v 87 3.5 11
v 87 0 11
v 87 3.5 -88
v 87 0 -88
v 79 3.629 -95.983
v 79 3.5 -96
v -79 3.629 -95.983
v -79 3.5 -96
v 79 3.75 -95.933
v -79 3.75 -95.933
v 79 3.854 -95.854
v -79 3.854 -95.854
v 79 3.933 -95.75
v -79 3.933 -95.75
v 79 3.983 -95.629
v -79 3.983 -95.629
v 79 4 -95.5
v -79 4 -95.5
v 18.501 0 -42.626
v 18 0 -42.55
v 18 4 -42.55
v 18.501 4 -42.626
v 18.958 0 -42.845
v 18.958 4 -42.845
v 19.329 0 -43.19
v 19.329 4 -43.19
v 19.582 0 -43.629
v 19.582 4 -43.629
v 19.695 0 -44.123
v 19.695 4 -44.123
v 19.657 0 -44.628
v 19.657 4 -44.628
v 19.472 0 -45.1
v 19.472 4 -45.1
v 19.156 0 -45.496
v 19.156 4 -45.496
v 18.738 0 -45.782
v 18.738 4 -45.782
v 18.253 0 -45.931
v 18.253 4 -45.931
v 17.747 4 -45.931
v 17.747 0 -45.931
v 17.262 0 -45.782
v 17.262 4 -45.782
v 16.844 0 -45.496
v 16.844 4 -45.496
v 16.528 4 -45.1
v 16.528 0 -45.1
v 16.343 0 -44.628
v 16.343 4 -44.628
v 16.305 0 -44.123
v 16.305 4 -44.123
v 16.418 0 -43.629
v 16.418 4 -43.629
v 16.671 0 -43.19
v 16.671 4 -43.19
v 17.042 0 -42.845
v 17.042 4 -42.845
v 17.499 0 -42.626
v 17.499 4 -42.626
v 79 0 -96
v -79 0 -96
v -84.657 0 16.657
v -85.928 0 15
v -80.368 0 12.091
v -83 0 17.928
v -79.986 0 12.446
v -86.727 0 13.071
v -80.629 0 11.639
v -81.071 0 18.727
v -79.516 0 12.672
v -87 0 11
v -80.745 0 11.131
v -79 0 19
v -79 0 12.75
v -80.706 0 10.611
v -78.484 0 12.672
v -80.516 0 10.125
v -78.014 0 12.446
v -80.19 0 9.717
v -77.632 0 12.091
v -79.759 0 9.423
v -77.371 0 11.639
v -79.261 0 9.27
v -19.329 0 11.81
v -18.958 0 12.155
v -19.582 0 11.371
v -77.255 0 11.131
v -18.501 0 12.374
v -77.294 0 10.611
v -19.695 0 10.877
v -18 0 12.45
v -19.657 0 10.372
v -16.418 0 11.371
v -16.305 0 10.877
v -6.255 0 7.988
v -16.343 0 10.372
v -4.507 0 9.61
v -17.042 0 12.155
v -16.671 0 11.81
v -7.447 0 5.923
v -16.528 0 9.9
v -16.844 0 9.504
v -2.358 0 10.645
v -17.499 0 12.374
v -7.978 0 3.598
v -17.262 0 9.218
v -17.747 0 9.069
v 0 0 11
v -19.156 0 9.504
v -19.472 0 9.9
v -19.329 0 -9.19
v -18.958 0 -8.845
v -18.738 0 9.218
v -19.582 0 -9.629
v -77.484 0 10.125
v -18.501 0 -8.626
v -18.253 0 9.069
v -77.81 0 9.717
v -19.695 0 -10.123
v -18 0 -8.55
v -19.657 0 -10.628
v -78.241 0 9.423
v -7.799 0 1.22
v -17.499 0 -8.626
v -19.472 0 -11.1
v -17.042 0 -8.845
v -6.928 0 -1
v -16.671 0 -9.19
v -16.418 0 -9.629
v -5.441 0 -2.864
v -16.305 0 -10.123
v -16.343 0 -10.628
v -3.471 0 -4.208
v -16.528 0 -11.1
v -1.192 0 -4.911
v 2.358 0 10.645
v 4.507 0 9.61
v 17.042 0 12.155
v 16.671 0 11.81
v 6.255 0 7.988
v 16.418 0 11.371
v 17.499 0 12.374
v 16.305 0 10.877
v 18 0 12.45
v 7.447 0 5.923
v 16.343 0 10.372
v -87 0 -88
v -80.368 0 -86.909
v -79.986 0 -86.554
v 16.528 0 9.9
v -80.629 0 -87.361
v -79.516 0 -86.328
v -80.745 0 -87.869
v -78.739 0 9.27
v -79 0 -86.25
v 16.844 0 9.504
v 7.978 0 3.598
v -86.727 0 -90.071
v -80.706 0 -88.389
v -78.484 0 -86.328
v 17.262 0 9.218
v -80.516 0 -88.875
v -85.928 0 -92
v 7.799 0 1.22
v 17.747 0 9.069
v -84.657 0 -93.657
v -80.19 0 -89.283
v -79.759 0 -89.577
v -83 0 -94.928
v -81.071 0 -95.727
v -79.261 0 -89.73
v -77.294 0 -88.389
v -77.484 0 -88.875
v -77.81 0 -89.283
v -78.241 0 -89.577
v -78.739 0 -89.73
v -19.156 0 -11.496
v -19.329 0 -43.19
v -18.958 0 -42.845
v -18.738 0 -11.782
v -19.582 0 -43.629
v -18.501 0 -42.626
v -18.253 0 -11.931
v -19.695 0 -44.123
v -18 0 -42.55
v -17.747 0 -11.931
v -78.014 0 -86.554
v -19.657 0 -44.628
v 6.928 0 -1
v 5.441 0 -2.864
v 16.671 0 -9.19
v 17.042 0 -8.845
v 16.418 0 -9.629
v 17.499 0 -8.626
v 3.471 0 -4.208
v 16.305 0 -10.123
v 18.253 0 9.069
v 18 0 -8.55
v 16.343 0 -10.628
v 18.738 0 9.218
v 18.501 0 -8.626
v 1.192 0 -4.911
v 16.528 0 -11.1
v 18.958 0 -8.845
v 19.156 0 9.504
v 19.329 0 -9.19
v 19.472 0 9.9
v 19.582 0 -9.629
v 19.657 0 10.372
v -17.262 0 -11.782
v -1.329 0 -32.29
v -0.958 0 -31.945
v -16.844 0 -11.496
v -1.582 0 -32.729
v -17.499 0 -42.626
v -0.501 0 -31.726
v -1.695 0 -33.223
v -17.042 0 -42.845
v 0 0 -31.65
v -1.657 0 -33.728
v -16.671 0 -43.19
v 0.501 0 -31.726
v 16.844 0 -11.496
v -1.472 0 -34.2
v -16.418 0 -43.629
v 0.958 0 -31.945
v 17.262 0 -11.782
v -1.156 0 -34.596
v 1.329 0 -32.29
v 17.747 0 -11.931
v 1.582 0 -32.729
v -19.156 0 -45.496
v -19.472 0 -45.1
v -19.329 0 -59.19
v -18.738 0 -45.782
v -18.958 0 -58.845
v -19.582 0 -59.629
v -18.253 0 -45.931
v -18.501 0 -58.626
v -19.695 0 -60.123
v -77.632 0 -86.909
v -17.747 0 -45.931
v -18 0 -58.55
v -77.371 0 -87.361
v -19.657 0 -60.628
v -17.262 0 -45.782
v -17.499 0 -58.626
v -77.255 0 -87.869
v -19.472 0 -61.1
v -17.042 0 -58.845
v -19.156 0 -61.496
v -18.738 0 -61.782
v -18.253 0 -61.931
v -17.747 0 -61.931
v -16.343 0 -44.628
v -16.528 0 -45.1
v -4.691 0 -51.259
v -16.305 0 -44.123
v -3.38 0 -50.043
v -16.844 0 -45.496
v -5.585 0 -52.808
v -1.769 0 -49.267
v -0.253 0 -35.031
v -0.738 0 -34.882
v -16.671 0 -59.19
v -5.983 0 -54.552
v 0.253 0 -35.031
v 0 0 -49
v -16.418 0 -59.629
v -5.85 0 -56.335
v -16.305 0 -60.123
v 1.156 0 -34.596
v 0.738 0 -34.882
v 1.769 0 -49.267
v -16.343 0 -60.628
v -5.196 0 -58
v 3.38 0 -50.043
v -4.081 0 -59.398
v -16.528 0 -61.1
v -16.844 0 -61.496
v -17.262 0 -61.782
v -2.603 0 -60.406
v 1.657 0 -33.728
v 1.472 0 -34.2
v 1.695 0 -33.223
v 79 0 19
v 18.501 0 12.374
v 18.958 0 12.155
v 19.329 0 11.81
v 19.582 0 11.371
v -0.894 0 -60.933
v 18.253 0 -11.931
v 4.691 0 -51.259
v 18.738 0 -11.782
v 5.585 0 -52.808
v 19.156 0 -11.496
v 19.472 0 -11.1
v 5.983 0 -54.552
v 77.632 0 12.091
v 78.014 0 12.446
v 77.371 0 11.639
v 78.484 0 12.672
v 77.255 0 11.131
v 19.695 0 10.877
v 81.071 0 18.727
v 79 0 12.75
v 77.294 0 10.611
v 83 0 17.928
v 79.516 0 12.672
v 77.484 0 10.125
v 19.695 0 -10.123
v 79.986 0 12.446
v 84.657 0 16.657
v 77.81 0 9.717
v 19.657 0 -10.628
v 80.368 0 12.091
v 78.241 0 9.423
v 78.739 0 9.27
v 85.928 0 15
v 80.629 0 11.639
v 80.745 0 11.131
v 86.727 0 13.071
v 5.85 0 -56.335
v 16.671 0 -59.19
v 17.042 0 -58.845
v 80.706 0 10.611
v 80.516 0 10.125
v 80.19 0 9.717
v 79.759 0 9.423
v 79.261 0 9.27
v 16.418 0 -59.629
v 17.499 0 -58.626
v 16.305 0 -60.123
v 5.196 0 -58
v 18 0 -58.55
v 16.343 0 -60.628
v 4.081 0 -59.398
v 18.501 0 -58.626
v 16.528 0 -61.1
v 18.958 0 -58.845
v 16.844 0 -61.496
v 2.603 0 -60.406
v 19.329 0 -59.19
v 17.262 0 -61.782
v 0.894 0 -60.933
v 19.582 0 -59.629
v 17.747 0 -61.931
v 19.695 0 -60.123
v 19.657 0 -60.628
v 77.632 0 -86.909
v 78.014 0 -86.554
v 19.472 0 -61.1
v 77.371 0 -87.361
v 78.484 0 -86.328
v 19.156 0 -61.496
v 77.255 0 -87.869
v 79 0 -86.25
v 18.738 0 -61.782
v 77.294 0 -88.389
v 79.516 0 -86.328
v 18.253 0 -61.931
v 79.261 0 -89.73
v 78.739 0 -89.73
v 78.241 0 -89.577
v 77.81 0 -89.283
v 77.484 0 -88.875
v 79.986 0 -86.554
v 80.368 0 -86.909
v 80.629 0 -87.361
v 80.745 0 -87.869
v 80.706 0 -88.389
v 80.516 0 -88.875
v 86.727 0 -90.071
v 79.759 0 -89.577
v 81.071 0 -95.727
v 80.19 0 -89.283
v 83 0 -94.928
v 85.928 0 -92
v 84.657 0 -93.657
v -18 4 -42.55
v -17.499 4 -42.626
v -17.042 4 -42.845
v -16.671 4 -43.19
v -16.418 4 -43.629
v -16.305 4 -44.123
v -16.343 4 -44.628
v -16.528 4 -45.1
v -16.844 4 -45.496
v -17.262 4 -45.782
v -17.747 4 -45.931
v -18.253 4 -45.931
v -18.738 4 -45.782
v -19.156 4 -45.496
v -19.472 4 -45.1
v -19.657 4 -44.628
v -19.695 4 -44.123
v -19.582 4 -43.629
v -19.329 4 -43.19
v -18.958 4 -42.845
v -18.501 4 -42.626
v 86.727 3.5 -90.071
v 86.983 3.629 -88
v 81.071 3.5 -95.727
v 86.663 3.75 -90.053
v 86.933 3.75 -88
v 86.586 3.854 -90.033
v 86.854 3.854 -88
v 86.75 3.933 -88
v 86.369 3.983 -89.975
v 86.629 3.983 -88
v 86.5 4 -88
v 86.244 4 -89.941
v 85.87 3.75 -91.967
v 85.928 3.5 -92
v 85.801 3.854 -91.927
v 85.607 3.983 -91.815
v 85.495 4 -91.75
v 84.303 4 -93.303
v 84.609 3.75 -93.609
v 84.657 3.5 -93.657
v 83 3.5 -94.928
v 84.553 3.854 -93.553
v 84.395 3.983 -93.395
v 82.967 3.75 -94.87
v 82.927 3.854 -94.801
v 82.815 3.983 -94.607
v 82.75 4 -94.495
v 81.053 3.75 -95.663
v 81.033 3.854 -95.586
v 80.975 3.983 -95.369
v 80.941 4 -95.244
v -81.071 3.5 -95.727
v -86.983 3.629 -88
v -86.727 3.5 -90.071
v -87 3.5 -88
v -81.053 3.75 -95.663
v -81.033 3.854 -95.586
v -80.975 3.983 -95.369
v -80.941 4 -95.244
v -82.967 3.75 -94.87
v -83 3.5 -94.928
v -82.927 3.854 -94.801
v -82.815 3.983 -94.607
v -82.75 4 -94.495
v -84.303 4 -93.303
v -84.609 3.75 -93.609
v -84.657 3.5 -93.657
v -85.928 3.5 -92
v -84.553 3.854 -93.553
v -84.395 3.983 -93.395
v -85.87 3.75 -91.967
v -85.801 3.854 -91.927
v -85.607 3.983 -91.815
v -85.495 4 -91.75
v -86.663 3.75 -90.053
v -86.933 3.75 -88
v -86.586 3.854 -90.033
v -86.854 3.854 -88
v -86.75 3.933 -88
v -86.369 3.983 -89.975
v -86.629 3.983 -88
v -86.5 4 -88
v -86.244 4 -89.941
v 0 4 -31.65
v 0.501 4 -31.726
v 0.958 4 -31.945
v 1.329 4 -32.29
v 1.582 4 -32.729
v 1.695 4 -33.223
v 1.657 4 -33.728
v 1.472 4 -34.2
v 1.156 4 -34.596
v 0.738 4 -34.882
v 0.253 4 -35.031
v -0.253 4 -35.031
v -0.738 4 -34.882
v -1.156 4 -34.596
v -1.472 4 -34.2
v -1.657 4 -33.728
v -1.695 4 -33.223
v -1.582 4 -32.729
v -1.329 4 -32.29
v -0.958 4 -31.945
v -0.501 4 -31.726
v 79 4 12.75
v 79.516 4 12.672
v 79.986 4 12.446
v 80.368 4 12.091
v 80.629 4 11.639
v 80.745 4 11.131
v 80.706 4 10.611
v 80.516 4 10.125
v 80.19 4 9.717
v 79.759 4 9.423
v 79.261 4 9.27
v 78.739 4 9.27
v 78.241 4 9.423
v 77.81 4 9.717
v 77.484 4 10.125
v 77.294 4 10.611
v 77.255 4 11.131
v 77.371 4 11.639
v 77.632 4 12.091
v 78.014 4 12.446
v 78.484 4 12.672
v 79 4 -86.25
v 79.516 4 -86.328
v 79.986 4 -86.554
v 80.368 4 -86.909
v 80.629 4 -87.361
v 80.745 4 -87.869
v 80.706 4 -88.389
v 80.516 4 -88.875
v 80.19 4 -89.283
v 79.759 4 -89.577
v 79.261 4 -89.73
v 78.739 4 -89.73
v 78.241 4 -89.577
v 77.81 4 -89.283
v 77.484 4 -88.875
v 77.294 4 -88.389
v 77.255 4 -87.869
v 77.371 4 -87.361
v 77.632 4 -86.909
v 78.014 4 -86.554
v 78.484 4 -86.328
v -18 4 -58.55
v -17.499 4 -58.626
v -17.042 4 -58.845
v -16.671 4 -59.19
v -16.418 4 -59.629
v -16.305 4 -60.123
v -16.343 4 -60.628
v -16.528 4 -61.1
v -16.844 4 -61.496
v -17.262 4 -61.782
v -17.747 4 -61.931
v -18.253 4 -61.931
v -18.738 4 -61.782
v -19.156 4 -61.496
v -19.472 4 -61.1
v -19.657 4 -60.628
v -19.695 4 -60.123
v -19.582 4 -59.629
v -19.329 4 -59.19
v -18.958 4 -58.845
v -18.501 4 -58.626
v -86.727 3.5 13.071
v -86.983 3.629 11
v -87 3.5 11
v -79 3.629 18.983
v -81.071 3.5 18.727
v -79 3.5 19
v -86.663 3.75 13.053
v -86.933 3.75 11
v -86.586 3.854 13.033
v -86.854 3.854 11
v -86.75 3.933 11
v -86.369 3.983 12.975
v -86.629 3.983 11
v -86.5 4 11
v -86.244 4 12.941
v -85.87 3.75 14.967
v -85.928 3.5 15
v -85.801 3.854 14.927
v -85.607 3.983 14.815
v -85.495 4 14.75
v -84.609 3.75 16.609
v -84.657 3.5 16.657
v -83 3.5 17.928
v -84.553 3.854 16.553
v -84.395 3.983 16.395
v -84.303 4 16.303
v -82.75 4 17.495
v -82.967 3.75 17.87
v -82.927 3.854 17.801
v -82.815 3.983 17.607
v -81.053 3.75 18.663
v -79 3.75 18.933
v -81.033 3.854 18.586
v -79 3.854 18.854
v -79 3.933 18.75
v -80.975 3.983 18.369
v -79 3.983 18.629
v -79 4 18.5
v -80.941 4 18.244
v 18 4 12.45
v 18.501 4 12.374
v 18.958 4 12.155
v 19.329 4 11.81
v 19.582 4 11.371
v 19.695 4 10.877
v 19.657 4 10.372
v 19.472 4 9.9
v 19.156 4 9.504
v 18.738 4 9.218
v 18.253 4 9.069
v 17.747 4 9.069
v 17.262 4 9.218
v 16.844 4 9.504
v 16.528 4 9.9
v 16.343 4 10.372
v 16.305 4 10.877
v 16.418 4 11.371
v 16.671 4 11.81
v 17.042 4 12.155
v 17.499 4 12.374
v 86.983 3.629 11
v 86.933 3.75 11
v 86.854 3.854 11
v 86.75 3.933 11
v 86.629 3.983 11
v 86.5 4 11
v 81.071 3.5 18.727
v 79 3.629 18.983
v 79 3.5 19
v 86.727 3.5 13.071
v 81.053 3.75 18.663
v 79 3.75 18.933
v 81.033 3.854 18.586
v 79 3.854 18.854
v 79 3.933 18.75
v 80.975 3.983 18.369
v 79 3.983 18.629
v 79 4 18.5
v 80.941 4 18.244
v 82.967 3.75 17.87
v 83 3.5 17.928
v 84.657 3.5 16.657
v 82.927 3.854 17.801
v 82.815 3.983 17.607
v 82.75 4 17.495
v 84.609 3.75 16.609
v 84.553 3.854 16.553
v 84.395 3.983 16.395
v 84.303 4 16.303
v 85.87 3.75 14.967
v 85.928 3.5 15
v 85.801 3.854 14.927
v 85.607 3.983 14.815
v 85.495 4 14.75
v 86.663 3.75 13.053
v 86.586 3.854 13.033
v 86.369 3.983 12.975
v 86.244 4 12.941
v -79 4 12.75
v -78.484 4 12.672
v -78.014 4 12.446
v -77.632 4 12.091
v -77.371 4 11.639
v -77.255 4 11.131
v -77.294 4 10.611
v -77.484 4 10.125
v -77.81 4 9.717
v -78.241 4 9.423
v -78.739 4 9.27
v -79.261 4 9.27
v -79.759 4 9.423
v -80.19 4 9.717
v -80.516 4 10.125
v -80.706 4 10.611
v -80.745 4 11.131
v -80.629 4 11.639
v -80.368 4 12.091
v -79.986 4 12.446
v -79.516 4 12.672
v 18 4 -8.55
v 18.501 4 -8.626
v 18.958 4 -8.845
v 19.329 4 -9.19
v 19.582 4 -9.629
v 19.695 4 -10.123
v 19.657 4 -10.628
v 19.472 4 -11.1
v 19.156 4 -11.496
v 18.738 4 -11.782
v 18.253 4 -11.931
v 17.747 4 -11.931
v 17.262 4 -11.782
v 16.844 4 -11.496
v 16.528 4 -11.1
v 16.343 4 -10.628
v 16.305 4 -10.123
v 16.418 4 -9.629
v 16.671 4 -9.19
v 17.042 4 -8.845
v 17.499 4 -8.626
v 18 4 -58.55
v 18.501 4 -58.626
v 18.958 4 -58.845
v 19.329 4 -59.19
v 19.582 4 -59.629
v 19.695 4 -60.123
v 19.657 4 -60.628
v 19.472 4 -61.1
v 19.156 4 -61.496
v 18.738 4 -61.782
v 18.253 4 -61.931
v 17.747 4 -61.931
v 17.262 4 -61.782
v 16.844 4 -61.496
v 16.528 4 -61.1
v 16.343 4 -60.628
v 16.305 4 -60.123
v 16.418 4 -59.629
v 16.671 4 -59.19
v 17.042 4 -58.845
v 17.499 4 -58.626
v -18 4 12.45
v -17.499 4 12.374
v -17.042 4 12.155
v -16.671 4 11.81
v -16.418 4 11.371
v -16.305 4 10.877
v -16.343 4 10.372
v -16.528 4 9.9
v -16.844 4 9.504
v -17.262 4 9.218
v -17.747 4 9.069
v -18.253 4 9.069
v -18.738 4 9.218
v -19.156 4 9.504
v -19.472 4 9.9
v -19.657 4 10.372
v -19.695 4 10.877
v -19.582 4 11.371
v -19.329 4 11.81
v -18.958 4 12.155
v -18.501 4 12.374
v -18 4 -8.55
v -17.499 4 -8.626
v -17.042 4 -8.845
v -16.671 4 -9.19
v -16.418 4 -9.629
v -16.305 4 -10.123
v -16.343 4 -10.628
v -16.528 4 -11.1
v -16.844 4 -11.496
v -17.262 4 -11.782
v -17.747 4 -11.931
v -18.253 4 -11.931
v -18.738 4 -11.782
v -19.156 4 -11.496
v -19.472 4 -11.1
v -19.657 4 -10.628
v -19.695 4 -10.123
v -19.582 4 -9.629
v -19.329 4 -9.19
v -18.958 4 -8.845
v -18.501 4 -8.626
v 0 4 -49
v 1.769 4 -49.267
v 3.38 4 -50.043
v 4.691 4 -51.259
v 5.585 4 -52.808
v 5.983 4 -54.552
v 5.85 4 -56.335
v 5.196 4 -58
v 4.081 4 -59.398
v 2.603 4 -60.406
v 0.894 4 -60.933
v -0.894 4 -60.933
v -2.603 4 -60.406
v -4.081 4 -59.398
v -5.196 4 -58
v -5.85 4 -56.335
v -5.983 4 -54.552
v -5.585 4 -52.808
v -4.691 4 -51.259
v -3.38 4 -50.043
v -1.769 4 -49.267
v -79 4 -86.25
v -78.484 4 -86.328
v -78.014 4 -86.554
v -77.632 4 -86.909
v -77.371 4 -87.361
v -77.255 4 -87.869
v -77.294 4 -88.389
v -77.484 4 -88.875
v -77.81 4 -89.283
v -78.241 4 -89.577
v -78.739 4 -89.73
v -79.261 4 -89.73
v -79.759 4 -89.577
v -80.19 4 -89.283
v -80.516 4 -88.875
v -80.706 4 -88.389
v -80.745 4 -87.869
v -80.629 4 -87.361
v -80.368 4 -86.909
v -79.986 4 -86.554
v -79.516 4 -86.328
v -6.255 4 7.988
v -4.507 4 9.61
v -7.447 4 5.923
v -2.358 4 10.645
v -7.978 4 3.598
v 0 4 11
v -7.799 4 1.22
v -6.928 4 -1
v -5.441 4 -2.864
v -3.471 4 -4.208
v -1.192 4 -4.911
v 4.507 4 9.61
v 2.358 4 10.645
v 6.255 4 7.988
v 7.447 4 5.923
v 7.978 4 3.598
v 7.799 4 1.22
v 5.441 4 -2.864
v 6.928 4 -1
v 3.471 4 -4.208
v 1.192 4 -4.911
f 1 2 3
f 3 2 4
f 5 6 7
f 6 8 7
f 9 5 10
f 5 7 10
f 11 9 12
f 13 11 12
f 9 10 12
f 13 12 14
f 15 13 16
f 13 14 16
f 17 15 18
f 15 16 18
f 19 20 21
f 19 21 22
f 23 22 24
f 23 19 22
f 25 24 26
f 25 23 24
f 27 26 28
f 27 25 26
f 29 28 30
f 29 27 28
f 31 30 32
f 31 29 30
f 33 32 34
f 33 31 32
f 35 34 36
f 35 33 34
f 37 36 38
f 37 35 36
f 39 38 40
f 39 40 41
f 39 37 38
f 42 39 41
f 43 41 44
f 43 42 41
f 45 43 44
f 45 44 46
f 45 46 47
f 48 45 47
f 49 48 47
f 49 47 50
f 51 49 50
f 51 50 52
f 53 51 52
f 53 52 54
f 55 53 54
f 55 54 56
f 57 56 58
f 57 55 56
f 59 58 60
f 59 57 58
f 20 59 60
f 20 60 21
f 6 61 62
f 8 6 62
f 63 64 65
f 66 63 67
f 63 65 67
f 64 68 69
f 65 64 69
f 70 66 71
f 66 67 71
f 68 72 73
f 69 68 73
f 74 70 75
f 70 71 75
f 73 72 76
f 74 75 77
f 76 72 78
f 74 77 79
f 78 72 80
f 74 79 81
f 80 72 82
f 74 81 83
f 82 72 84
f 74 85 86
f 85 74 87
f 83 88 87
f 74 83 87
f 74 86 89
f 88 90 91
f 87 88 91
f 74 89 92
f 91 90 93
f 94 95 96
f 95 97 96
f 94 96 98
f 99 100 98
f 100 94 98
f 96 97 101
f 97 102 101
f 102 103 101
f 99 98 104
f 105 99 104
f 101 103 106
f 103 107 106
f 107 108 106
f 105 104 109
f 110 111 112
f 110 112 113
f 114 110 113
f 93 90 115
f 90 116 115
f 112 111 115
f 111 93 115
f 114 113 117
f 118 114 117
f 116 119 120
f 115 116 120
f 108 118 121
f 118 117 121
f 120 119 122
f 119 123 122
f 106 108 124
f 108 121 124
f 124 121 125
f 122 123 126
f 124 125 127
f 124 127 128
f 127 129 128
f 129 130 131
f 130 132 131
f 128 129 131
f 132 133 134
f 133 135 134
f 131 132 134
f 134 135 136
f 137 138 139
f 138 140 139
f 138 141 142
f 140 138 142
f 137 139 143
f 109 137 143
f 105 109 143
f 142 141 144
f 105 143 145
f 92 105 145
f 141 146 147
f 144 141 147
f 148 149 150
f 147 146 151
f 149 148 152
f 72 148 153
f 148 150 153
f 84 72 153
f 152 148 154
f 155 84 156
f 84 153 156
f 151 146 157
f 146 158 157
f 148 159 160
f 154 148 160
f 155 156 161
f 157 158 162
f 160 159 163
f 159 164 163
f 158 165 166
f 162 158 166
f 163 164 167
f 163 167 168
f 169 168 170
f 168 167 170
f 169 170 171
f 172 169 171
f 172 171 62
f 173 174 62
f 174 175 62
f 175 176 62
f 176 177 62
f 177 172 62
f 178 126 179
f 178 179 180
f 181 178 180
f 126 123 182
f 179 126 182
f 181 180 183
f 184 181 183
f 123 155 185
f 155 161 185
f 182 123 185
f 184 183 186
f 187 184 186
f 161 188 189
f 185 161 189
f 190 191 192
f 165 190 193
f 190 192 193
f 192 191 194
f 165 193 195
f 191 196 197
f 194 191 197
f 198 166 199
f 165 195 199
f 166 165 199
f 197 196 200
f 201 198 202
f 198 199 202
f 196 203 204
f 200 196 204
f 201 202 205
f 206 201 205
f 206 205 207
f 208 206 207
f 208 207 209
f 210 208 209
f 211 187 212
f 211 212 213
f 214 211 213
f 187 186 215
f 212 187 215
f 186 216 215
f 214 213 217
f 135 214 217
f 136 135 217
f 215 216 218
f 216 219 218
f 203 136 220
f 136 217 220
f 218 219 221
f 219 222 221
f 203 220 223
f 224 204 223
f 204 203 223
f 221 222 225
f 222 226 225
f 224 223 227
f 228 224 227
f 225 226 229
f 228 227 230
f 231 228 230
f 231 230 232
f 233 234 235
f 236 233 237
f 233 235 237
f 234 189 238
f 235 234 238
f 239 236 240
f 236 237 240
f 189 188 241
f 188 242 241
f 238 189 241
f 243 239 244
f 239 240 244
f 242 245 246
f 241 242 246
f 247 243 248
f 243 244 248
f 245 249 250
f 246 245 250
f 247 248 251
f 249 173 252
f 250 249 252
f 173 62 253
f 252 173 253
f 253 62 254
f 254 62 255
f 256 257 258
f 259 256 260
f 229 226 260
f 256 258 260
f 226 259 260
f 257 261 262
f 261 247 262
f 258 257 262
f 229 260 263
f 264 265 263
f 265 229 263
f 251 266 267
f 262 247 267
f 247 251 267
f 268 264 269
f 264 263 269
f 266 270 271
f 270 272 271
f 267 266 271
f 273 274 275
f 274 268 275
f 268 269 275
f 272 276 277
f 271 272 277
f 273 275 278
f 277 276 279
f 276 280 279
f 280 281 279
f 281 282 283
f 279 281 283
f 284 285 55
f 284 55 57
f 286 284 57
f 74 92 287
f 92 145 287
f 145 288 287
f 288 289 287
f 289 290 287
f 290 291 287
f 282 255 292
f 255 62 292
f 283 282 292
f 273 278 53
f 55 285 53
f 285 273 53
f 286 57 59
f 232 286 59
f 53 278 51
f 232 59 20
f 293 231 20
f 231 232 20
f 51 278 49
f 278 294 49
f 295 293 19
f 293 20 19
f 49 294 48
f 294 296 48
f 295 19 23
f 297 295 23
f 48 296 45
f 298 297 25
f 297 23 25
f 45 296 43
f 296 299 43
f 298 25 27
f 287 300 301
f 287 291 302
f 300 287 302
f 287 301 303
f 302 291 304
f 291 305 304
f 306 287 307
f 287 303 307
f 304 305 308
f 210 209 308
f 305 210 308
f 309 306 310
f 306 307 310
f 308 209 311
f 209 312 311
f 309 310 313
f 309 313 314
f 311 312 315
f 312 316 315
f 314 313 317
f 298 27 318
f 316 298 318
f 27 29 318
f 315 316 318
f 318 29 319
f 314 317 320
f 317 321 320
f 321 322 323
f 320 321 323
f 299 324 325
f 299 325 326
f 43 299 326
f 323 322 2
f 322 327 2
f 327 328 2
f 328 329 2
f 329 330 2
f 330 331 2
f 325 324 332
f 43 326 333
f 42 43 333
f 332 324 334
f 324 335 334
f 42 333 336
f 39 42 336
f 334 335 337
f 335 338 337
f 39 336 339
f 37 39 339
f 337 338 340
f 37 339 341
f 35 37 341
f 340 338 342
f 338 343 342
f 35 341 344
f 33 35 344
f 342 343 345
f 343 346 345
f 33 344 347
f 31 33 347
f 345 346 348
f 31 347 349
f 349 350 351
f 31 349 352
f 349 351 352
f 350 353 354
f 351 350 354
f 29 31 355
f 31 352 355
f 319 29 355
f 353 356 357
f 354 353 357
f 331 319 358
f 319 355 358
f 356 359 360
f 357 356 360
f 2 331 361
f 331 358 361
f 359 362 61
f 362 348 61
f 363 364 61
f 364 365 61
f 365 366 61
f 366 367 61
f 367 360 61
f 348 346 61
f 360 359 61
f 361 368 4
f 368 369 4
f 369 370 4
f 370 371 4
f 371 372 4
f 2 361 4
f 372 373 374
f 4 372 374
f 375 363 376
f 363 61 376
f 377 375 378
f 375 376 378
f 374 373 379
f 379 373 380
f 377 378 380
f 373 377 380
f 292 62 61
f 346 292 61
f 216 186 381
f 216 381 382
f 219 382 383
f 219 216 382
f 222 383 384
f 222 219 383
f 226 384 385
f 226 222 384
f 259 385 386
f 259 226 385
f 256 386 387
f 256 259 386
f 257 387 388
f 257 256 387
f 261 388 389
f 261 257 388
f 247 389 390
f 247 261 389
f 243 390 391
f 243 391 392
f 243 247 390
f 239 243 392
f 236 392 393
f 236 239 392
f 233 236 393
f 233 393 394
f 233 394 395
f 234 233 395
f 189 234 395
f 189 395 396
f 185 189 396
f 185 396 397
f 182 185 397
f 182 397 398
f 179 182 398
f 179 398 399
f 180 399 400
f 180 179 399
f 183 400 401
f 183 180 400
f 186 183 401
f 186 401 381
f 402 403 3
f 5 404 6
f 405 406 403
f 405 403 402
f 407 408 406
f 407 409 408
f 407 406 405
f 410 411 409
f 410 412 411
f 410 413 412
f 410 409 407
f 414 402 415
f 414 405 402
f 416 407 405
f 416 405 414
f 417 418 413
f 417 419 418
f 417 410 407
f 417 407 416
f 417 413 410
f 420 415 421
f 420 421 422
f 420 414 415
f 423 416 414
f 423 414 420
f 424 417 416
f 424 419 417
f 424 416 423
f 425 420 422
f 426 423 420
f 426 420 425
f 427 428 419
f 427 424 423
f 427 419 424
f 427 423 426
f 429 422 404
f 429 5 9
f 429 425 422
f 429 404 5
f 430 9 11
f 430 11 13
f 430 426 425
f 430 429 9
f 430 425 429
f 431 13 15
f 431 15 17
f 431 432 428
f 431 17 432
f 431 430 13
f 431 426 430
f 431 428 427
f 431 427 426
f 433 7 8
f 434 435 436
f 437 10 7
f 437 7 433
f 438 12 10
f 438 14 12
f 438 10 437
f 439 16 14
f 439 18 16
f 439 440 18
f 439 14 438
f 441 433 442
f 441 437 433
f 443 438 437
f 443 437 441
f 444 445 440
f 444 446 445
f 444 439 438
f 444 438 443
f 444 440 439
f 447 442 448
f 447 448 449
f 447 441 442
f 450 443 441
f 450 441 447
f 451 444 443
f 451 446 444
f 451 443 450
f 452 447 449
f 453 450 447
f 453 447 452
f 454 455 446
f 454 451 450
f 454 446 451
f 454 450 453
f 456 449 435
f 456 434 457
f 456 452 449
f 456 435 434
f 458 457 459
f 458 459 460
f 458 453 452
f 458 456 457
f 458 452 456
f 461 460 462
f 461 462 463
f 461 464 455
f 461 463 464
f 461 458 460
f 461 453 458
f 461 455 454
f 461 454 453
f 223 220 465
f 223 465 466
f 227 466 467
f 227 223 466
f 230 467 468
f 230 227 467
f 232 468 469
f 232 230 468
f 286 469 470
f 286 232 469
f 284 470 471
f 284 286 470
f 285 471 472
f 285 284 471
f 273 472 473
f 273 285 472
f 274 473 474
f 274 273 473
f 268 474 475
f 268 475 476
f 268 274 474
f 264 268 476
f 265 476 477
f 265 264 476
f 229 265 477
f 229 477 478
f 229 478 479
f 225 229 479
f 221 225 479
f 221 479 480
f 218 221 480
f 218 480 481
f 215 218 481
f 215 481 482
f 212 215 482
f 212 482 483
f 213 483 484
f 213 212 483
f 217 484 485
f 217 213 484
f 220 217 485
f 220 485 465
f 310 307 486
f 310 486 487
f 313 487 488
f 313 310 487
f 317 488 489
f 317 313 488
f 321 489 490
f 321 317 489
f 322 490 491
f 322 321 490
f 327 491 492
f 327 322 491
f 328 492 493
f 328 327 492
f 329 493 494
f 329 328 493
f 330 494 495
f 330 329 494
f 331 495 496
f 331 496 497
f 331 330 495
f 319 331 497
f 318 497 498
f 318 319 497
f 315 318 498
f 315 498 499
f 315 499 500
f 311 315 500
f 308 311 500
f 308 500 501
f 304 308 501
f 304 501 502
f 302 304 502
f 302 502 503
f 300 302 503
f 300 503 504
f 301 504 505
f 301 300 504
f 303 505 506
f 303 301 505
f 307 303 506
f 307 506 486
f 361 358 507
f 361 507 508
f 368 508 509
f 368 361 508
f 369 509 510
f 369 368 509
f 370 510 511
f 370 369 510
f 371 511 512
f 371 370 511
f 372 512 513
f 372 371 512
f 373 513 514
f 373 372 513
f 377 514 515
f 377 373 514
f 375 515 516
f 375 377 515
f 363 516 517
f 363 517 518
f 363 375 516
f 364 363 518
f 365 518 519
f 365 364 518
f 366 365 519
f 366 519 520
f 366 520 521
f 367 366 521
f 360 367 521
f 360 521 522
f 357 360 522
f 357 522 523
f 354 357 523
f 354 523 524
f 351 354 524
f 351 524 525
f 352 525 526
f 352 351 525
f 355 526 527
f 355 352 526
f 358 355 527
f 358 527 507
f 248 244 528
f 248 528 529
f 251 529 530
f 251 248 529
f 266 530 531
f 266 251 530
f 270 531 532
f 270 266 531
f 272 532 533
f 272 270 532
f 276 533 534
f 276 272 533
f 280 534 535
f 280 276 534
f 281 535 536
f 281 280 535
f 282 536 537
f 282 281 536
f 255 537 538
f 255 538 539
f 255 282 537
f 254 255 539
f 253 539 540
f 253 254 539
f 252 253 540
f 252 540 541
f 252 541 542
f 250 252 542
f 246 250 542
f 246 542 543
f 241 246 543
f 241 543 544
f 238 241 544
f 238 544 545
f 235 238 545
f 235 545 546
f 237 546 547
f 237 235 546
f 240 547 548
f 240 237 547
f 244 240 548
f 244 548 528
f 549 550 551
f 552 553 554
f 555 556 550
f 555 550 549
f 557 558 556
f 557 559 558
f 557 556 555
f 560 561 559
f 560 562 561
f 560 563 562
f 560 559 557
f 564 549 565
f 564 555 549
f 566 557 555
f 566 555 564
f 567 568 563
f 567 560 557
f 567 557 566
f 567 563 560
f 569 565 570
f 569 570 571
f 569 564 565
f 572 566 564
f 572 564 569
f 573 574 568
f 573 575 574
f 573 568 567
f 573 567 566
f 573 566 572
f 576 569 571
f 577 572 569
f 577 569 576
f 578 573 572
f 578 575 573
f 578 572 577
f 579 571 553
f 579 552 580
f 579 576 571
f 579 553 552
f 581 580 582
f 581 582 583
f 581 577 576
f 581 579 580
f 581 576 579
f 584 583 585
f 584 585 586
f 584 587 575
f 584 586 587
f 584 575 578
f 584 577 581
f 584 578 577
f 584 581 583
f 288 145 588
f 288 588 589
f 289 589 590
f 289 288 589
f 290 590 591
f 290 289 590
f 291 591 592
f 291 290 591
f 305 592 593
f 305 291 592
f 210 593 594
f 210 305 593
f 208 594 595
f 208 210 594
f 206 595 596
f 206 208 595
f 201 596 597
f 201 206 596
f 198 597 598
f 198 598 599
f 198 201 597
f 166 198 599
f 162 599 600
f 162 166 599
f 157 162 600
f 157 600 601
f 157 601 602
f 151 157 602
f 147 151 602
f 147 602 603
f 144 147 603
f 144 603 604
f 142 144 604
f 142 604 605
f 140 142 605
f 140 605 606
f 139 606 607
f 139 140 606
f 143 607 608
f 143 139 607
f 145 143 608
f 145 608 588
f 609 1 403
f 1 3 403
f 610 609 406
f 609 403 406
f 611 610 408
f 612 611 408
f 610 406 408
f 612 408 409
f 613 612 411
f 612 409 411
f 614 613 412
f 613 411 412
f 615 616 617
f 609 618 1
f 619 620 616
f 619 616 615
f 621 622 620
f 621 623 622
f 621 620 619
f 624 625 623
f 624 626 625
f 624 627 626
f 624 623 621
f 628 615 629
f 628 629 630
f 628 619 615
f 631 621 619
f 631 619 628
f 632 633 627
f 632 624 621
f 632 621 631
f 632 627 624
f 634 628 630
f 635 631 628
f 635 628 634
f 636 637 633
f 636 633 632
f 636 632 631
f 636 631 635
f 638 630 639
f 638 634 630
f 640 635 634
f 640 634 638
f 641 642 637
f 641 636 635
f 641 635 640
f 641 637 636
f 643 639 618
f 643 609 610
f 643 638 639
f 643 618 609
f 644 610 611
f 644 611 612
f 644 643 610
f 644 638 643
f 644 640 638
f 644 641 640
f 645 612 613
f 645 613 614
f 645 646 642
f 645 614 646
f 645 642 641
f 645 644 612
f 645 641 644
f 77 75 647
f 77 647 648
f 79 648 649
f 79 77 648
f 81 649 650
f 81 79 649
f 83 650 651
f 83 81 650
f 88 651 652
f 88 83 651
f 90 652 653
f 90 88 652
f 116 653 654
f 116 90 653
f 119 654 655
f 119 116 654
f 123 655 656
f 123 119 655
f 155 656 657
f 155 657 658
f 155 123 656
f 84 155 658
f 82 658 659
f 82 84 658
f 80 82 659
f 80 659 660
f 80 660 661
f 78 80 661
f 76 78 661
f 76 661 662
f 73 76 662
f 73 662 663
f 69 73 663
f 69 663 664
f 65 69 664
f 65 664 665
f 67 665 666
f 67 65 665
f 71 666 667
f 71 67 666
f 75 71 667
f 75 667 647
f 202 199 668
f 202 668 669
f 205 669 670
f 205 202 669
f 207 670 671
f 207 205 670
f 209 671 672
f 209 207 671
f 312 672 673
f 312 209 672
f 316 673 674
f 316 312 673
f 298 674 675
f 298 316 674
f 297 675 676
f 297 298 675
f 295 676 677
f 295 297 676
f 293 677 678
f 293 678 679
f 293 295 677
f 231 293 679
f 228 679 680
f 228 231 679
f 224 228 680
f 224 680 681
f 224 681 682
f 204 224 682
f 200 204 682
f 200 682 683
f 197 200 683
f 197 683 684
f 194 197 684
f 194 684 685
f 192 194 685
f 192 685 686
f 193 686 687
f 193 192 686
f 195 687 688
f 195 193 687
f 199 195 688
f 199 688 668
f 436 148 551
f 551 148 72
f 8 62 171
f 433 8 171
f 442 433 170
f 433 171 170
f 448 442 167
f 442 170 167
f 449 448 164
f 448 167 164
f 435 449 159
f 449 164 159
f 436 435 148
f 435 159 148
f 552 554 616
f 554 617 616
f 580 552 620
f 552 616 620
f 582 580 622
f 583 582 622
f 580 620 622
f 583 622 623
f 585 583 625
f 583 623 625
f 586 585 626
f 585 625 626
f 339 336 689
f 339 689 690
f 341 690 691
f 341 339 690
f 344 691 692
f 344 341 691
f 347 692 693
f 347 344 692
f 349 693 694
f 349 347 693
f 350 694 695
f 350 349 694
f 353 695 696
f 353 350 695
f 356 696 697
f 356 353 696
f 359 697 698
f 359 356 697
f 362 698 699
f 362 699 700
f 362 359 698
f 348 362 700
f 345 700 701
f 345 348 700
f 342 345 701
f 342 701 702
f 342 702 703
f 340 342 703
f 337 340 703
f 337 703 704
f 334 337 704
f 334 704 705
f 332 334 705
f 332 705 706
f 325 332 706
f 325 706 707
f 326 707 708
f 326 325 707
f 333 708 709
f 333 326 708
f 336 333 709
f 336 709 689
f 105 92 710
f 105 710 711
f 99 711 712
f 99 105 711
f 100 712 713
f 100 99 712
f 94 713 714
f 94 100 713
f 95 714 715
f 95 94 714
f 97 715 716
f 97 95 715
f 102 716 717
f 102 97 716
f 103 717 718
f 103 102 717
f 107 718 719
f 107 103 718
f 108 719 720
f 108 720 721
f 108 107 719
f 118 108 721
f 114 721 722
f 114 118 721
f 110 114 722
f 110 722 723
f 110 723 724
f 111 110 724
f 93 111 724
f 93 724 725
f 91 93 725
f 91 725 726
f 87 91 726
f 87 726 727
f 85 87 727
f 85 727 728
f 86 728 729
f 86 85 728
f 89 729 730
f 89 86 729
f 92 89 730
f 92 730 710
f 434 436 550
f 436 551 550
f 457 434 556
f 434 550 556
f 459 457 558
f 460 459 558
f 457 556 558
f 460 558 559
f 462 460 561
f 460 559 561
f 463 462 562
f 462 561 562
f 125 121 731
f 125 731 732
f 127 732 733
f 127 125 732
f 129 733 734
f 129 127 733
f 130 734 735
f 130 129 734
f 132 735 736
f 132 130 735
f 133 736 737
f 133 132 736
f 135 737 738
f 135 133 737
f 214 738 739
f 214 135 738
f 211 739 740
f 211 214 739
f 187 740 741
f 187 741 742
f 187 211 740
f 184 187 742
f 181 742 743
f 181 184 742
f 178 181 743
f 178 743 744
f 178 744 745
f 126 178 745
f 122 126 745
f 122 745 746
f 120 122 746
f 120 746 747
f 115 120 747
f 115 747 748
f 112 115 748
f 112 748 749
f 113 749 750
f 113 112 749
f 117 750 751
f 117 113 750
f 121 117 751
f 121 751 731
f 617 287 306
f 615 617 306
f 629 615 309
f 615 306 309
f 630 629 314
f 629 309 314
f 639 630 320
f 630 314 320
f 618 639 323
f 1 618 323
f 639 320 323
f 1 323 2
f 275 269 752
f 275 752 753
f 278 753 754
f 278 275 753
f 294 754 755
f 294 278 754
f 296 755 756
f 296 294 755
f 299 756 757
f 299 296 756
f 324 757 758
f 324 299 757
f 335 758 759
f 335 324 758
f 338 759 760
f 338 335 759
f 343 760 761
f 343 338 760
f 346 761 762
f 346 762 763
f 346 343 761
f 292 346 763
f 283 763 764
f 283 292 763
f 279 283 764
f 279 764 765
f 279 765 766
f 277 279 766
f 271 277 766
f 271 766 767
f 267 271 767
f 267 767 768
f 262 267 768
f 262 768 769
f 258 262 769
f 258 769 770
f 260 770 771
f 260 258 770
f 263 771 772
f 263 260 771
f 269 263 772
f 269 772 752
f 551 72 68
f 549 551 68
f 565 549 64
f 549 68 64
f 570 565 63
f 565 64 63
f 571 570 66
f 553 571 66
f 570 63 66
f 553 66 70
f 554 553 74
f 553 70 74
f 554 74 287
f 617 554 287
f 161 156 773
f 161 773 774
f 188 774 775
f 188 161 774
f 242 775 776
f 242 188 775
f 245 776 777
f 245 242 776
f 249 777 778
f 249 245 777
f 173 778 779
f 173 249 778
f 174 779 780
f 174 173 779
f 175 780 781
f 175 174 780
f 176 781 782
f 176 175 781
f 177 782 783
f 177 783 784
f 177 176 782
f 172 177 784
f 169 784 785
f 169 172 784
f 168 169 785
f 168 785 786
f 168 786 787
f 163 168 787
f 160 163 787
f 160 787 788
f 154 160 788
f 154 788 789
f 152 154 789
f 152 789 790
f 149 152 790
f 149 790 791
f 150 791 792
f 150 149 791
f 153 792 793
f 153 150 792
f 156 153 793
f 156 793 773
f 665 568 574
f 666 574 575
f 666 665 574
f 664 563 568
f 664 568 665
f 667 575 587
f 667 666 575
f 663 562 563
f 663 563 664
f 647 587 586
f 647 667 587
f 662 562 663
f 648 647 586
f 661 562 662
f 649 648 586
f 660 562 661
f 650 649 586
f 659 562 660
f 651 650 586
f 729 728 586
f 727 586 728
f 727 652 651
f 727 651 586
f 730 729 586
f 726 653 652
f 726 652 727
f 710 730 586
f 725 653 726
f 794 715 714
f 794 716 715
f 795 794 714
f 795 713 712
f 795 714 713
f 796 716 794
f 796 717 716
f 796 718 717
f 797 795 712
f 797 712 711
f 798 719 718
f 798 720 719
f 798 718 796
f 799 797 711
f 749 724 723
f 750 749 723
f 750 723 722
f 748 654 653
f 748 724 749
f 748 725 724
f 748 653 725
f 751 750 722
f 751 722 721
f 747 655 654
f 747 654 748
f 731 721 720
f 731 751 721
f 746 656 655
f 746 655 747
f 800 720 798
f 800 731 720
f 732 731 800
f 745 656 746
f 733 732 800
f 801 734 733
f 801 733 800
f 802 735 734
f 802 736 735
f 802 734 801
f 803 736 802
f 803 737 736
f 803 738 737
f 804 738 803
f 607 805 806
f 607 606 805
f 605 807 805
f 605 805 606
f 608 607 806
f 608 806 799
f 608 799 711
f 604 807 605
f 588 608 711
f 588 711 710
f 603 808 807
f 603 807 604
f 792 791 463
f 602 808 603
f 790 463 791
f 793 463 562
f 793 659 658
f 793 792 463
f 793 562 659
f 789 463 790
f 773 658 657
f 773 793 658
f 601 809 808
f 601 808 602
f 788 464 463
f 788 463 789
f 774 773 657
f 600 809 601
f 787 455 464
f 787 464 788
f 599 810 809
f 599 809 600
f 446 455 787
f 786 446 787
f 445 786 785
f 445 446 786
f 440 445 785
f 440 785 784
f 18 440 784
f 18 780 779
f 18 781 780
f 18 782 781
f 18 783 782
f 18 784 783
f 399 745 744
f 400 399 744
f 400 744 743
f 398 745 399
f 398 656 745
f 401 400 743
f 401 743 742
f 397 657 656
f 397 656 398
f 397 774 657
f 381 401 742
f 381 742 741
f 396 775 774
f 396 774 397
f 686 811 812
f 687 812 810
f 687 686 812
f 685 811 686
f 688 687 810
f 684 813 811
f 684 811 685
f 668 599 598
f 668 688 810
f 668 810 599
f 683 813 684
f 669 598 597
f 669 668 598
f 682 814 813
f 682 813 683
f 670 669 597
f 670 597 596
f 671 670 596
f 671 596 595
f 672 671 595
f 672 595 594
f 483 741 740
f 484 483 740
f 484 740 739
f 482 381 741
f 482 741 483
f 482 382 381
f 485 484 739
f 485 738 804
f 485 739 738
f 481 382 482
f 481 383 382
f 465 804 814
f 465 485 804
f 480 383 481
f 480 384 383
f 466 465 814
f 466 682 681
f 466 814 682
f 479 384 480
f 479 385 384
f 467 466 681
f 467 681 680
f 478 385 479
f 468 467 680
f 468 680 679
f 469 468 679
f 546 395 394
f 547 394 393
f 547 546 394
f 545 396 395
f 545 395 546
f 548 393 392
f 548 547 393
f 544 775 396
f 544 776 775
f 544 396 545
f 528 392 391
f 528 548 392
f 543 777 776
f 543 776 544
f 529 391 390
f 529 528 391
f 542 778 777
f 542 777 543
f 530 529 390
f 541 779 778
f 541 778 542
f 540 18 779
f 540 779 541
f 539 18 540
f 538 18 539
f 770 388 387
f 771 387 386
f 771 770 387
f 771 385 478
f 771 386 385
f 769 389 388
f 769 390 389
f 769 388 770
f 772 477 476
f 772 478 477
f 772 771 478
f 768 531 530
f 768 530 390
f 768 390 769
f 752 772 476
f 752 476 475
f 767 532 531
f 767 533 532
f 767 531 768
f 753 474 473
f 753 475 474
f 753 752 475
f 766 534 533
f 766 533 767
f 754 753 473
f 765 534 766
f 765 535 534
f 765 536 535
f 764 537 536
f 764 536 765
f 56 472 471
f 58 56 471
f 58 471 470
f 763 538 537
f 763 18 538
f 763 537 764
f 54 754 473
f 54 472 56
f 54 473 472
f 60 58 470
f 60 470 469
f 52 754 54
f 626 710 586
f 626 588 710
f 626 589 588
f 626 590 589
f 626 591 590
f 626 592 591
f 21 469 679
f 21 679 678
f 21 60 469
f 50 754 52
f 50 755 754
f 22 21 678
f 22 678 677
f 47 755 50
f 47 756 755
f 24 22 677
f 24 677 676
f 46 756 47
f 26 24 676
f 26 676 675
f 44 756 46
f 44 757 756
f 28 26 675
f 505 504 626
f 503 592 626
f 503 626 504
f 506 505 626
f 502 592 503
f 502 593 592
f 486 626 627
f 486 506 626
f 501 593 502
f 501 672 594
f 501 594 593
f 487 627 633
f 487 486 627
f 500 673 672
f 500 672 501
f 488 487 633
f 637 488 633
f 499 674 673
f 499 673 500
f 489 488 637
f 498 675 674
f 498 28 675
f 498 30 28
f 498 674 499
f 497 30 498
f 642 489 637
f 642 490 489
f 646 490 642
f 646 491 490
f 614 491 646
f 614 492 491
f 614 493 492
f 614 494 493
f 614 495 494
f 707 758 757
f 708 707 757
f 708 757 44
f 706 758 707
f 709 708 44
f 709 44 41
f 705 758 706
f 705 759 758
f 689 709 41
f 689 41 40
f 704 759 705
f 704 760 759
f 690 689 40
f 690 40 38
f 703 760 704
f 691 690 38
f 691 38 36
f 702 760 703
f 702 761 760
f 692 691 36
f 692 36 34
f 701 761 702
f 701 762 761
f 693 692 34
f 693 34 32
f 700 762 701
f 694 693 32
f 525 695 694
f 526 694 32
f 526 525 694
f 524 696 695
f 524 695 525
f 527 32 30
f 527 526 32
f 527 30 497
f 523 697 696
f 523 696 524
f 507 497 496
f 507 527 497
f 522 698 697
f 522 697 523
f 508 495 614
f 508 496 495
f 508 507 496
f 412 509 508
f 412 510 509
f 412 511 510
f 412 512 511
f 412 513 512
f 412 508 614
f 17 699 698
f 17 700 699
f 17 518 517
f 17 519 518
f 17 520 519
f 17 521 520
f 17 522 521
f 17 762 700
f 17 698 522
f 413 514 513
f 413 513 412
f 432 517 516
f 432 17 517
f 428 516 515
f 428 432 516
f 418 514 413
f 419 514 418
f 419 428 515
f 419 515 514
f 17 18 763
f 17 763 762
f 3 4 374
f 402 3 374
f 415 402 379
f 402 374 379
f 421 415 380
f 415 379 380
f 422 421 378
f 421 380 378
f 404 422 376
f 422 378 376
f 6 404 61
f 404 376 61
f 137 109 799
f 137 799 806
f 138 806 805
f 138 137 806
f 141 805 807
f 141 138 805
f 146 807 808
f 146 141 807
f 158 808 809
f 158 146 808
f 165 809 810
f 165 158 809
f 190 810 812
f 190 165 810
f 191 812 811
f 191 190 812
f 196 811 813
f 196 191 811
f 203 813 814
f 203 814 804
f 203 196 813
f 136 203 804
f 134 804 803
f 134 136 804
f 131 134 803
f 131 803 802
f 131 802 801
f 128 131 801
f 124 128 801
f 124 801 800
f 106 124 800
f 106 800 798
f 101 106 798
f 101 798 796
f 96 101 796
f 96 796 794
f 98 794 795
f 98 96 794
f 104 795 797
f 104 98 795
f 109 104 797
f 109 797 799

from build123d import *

# Parameters (mm, degrees)
SKETCH2_R           = 1.75
SKETCH2_R_2         = 8
SKETCH2_R_3         = 1.7
SKETCH2_R_4         = 6
BOSS_EXTRUDE1_DEPTH = 4
FILLET1_R           = 0.5


with BuildPart() as part:
    # Sketch2 → Boss-Extrude1 (new body)
    with BuildSketch(Plane(origin=(0, 0, 0), x_dir=(1, 0, 0), z_dir=(0, 1, 0))):
        with BuildLine():
            Line((87, -11), (87, 88))
            ThreePointArc((87, 88), (84.656854249, 93.656854249), (79, 96))
            Line((79, 96), (-79, 96))
            ThreePointArc((-79, 96), (-84.656854249, 93.656854249), (-87, 88))
            Line((-87, 88), (-87, -11))
            ThreePointArc((-87, -11), (-84.656854249, -16.656854249), (-79, -19))
            Line((-79, -19), (79, -19))
            ThreePointArc((79, -19), (84.656854249, -16.656854249), (87, -11))
        make_face()
        with Locations(Location((-79, 88, 0), (0, 0, 270))):
            Circle(SKETCH2_R, mode=Mode.SUBTRACT)
        with Locations(Location((79, 88, 0), (0, 0, 270))):
            Circle(SKETCH2_R, mode=Mode.SUBTRACT)
        with Locations(Location((79, -11, 0), (0, 0, 270))):
            Circle(SKETCH2_R, mode=Mode.SUBTRACT)
        with Locations(Location((-79, -11, 0), (0, 0, 270))):
            Circle(SKETCH2_R, mode=Mode.SUBTRACT)
        with Locations(Location((0, -3, 0), (0, 0, 270))):
            Circle(SKETCH2_R_2, mode=Mode.SUBTRACT)
        with Locations(Location((18, -10.75, 0), (0, 0, 270))):
            Circle(SKETCH2_R_3, mode=Mode.SUBTRACT)
        with Locations(Location((18, 10.25, 0), (0, 0, 270))):
            Circle(SKETCH2_R_3, mode=Mode.SUBTRACT)
        with Locations(Location((-18, -10.75, 0), (0, 0, 270))):
            Circle(SKETCH2_R_3, mode=Mode.SUBTRACT)
        with Locations(Location((-18, 10.25, 0), (0, 0, 270))):
            Circle(SKETCH2_R_3, mode=Mode.SUBTRACT)
        with Locations(Location((0, 33.35, 0), (0, 0, 270))):
            Circle(SKETCH2_R_3, mode=Mode.SUBTRACT)
        with Locations(Location((18, 60.25, 0), (0, 0, 270))):
            Circle(SKETCH2_R_3, mode=Mode.SUBTRACT)
        with Locations(Location((18, 44.25, 0), (0, 0, 270))):
            Circle(SKETCH2_R_3, mode=Mode.SUBTRACT)
        with Locations(Location((-18, 44.25, 0), (0, 0, 270))):
            Circle(SKETCH2_R_3, mode=Mode.SUBTRACT)
        with Locations(Location((0, 55, 0), (0, 0, 270))):
            Circle(SKETCH2_R_4, mode=Mode.SUBTRACT)
        with Locations(Location((-18, 60.25, 0), (0, 0, 270))):
            Circle(SKETCH2_R_3, mode=Mode.SUBTRACT)
    extrude(amount=BOSS_EXTRUDE1_DEPTH)

    # Fillet1
    fillet1_edges = [part.edges().sort_by_distance(p)[0] for p in [
        (84.656854249, 4, -93.656854249),
        (0, 4, -96),
        (-84.656854249, 4, -93.656854249),
        (-87, 4, -38.5),
        (-84.656854249, 4, 16.656854249),
        (0, 4, 19),
        (84.656854249, 4, 16.656854249),
        (87, 4, -38.5),
    ]]
    fillet(fillet1_edges, radius=FILLET1_R)


solid = part.part
